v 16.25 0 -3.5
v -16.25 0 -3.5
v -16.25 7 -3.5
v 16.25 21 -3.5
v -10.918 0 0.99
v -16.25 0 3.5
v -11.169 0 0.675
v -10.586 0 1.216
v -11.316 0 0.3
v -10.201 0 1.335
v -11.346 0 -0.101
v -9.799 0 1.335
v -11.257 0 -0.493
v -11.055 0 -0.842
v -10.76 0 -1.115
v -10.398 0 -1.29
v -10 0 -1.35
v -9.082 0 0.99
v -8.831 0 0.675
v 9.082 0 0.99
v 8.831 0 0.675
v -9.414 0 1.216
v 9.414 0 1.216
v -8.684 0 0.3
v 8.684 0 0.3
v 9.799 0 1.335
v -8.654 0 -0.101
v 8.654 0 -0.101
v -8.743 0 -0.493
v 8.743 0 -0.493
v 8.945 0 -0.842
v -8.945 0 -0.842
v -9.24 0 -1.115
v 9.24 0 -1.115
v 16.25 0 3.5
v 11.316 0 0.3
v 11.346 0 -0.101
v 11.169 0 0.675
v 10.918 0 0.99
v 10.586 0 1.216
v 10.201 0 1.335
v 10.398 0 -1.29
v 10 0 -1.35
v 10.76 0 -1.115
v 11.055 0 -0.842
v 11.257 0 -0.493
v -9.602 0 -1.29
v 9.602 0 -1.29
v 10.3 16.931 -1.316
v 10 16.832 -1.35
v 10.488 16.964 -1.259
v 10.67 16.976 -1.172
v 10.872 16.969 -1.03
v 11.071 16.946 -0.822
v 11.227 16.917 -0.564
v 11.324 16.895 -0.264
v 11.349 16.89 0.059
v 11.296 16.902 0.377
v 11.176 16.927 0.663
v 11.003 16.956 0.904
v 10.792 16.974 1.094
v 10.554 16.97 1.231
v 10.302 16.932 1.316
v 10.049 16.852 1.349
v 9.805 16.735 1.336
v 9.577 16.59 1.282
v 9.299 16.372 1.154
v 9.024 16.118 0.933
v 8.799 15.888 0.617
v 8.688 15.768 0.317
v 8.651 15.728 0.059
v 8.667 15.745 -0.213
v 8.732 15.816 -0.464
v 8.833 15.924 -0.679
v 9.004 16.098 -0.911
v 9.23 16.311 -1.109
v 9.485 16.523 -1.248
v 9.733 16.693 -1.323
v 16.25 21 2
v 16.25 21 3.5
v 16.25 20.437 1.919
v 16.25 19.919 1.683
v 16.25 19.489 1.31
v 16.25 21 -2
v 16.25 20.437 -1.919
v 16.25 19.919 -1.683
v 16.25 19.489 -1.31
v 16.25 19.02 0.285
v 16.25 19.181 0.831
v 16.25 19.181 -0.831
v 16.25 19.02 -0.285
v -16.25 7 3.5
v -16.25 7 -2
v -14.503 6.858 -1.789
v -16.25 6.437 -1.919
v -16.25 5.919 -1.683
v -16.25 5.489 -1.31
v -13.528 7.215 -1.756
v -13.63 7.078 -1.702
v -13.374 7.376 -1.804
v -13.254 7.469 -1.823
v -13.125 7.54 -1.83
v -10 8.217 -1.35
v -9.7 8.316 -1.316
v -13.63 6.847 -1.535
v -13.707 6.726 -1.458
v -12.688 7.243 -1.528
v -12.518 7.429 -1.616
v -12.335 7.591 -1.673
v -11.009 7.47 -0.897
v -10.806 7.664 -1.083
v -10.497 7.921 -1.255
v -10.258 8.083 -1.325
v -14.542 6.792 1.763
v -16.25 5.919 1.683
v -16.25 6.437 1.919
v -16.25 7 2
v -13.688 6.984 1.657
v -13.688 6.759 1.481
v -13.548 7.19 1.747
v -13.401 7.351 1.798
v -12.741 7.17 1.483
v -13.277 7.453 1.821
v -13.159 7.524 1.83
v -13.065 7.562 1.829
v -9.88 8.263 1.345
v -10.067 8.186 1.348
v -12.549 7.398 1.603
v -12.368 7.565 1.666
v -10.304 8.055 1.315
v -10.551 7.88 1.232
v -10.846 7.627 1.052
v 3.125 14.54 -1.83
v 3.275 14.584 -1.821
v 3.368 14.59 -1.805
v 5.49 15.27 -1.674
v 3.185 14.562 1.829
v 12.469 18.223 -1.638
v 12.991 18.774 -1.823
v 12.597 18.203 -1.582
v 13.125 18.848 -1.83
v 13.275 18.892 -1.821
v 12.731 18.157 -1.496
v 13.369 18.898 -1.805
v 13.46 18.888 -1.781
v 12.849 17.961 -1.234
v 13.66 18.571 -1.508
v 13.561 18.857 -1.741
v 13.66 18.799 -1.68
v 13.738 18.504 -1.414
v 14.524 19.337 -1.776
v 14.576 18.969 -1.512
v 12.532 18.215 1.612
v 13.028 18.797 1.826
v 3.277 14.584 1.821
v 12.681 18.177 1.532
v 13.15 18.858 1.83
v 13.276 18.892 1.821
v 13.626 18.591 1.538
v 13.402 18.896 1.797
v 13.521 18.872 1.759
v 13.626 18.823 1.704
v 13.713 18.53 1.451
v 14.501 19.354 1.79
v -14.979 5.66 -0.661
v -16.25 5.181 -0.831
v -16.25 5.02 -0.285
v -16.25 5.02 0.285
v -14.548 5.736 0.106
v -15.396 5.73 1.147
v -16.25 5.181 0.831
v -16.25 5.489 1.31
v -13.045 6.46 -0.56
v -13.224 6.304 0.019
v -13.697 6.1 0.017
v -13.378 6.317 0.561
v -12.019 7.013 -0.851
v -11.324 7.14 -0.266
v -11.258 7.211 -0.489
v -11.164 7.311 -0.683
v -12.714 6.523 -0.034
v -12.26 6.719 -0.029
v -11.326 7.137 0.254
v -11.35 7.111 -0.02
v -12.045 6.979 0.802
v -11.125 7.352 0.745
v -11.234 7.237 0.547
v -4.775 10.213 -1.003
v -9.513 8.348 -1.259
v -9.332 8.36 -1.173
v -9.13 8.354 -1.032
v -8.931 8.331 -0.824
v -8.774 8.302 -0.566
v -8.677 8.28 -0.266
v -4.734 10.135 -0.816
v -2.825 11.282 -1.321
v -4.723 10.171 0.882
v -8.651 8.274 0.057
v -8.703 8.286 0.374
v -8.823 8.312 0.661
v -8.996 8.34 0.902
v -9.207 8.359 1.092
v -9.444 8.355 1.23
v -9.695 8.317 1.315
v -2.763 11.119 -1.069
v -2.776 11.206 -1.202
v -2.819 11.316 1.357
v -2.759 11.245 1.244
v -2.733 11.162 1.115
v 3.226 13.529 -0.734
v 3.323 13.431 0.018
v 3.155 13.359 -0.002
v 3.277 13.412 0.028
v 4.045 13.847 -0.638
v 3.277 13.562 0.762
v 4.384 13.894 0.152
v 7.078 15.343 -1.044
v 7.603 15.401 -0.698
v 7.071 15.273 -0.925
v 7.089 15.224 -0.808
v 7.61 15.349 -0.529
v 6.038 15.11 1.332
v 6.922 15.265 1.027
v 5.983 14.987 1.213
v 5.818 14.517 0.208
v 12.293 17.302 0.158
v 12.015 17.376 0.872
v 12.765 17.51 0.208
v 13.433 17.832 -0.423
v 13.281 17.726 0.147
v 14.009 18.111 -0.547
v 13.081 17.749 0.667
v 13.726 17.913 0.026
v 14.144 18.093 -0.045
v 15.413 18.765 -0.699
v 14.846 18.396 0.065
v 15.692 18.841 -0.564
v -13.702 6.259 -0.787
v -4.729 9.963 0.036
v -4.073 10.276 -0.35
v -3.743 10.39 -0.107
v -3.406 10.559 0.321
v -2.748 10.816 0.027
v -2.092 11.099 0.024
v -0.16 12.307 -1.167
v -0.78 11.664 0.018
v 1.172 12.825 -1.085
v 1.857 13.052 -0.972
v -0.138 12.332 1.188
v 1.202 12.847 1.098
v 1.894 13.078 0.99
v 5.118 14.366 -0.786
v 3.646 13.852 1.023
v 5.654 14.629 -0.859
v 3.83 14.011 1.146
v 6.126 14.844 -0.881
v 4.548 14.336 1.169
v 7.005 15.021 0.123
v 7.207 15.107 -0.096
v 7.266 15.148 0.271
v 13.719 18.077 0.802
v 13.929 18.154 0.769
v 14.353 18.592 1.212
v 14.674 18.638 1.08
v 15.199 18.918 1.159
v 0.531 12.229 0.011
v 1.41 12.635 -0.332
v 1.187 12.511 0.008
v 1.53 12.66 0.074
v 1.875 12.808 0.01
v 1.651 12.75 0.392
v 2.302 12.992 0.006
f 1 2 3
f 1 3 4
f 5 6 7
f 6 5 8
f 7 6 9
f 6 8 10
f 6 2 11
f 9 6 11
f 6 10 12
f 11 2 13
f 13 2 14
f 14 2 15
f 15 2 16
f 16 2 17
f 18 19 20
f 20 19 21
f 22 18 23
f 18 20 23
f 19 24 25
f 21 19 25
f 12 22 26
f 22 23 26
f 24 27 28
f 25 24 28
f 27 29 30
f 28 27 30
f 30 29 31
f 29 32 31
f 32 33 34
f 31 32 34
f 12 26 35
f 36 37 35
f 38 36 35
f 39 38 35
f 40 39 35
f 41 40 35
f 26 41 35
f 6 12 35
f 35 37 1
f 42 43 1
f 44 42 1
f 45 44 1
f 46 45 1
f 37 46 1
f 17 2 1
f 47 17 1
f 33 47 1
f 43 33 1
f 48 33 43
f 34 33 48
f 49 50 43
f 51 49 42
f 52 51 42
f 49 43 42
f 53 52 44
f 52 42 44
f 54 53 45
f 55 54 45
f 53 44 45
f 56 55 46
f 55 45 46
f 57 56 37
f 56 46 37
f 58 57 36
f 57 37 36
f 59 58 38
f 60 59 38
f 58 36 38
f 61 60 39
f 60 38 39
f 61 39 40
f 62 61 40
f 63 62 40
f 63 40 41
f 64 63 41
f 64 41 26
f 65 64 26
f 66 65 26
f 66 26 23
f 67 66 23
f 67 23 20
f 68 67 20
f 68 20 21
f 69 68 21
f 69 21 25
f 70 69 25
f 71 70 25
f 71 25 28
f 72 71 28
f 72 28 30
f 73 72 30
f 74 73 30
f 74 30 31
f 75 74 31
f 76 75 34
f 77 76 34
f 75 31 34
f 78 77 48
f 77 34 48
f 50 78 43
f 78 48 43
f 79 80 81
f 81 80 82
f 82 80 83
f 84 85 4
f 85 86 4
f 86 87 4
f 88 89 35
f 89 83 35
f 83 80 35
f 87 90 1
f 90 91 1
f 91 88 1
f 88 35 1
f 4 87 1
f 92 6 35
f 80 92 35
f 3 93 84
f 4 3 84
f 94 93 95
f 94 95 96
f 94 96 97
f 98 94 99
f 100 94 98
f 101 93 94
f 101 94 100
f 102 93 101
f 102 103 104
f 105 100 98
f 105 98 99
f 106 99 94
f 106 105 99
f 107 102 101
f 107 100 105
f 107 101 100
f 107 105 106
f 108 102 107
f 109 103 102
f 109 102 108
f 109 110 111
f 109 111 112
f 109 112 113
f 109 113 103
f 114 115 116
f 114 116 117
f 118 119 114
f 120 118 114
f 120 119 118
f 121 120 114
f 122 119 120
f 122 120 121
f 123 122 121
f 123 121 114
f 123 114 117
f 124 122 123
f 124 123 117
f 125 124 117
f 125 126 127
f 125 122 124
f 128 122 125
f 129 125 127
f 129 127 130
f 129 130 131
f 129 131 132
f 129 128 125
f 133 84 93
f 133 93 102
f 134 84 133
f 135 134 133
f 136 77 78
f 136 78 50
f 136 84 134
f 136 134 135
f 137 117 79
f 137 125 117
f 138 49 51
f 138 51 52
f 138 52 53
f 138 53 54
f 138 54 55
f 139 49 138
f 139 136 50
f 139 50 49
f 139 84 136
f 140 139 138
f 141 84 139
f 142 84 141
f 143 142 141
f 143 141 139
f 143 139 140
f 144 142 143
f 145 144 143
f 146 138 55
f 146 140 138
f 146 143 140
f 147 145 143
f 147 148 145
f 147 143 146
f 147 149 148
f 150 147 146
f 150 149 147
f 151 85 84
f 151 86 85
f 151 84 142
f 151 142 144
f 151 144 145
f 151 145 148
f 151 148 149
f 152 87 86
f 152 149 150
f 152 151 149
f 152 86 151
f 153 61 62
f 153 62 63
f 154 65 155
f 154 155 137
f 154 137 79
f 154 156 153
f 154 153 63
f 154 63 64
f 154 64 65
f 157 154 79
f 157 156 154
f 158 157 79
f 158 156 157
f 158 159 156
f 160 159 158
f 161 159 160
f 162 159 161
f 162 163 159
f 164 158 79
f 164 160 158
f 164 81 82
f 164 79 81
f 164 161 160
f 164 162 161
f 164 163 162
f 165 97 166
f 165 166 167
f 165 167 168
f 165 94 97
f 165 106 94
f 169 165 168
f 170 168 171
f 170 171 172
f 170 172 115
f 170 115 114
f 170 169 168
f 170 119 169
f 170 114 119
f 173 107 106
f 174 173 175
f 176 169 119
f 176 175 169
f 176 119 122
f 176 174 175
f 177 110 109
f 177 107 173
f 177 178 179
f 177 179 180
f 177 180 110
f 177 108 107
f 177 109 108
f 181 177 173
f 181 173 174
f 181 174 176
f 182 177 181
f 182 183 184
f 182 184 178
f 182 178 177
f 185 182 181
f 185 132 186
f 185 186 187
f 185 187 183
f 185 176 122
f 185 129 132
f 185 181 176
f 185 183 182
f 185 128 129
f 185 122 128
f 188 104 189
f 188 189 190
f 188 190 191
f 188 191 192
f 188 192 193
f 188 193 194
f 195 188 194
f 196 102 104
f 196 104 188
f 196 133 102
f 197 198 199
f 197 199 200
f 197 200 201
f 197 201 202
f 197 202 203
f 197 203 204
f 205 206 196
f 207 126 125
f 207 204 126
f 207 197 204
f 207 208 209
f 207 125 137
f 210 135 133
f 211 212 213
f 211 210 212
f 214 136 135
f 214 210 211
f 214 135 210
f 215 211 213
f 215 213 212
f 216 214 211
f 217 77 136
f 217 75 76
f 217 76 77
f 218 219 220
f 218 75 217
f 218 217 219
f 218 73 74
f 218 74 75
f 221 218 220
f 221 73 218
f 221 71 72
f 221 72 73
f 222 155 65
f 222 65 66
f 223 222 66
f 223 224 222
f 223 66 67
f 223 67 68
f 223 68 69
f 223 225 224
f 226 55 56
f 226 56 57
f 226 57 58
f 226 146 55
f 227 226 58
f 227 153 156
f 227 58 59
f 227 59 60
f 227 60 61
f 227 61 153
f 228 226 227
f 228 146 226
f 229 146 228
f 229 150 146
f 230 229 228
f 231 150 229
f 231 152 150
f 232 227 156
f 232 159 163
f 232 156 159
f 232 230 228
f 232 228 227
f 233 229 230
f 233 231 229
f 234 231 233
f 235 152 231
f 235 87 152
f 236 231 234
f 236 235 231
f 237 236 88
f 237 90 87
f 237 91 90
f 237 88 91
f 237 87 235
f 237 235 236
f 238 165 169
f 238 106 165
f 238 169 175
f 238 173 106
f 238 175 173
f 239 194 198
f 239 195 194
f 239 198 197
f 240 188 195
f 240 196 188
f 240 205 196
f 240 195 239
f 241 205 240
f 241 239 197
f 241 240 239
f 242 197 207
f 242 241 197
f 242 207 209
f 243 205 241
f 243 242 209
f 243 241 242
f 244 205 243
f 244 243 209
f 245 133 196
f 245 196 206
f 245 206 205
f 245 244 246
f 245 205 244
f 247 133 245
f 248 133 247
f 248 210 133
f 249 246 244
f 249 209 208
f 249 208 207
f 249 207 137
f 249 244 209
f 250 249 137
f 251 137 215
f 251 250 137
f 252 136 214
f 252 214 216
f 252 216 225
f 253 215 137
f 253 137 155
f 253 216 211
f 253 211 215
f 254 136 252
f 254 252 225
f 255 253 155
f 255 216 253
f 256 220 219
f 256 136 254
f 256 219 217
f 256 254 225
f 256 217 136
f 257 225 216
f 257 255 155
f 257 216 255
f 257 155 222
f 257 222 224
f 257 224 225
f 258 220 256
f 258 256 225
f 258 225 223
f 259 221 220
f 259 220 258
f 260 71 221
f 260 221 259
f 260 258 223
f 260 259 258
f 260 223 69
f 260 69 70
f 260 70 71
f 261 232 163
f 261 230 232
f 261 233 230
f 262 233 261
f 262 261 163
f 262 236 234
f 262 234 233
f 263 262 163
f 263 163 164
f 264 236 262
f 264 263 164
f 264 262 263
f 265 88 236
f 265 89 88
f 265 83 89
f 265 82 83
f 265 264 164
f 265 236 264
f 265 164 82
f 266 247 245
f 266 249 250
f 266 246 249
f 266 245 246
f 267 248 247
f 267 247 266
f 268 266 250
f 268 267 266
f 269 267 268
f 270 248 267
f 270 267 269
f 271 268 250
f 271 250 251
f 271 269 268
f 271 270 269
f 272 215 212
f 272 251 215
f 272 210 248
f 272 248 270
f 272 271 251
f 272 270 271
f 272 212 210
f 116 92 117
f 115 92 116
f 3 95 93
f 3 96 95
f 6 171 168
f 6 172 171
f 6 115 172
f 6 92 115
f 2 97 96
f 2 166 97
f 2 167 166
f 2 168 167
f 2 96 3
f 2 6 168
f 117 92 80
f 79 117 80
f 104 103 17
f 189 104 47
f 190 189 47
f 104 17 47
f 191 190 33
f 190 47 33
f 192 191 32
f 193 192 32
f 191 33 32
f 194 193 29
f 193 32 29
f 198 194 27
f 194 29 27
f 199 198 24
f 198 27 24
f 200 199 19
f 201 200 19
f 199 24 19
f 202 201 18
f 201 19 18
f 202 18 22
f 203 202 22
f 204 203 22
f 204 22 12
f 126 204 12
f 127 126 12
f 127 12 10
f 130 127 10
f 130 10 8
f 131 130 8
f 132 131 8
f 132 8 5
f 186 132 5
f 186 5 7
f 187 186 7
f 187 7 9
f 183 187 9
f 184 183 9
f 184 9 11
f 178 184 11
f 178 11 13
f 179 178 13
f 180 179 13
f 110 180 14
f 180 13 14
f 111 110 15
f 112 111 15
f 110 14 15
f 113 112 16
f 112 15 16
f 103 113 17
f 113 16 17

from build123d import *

# Parameters (mm, degrees)
SKETCH_1_W          = 32.5
SKETCH_1_H          = 7
EXTRUDE_1_DEPTH     = 21
CUT_EXTRUDE_1_REACH = 28.783
SKETCH_2_R          = 1.35
CUT_EXTRUDE_2_REACH = 29.46


with BuildPart() as part:
    # 草图1 → 凸台-拉伸1 (new body)
    with BuildSketch(Plane(origin=(0, 0, 0), x_dir=(1, 0, 0), z_dir=(0, 1, 0))):
        Rectangle(SKETCH_1_W, SKETCH_1_H)
    extrude(amount=EXTRUDE_1_DEPTH)

    # 草图2 → 切除-拉伸1 (cut, up to next)
    with BuildSketch(Plane.XZ, mode=Mode.PRIVATE) as cut_extrude_1_sk1:
        with Locations(Location((-10, 0, 0), (0, 0, 270))):
            Circle(SKETCH_2_R)
    cut_extrude_1_tool1 = extrude(cut_extrude_1_sk1.sketch, amount=-CUT_EXTRUDE_1_REACH, mode=Mode.PRIVATE) & part.part
    # 草图2 → 切除-拉伸1 (cut, up to next)
    with BuildSketch(Plane.XZ, mode=Mode.PRIVATE) as cut_extrude_1_sk2:
        with Locations(Location((10, 0, 0), (0, 0, 270))):
            Circle(SKETCH_2_R)
    cut_extrude_1_tool2 = extrude(cut_extrude_1_sk2.sketch, amount=-CUT_EXTRUDE_1_REACH, mode=Mode.PRIVATE) & part.part
    add(cut_extrude_1_tool1.solids().sort_by_distance((-10, 0, 0))[0], mode=Mode.SUBTRACT)
    add(cut_extrude_1_tool2.solids().sort_by_distance((10, 0, 0))[0], mode=Mode.SUBTRACT)

    # 草图3 → 切除-拉伸2 (cut, up to next)
    with BuildSketch(Plane.XY.offset(3.5), mode=Mode.PRIVATE) as cut_extrude_2_sk1:
        Polygon((-16.25, 21), (-16.25, 7), (16.25, 21), align=None)
    cut_extrude_2_tool1 = extrude(cut_extrude_2_sk1.sketch, amount=-CUT_EXTRUDE_2_REACH, mode=Mode.PRIVATE) & part.part
    add(cut_extrude_2_tool1.solids().sort_by_distance((-5.416667, 16.333333, 3.5))[0], mode=Mode.SUBTRACT)

    # 切除-扫描1: sweep along a path in 草图5
    with BuildLine(Plane(origin=(-5.086843681, 11.80874426, 0), x_dir=(0.9184126158110062, 0.3956238960416641, 0), z_dir=(-0.3956238960416641, 0.9184126158110062, 0))) as sweep_1_path:
        Line((-12.154837735, 0), (23.232306824, 0))
    # 草图4 → 切除-扫描1 (sweep, cut)
    with BuildSketch(Plane.ZY.offset(16.25)):
        with BuildLine():
            Line((-2, 7), (2, 7))
            ThreePointArc((2, 7), (0, 5), (-2, 7))
        make_face()
    sweep(path=sweep_1_path.line, mode=Mode.SUBTRACT)


solid = part.part
